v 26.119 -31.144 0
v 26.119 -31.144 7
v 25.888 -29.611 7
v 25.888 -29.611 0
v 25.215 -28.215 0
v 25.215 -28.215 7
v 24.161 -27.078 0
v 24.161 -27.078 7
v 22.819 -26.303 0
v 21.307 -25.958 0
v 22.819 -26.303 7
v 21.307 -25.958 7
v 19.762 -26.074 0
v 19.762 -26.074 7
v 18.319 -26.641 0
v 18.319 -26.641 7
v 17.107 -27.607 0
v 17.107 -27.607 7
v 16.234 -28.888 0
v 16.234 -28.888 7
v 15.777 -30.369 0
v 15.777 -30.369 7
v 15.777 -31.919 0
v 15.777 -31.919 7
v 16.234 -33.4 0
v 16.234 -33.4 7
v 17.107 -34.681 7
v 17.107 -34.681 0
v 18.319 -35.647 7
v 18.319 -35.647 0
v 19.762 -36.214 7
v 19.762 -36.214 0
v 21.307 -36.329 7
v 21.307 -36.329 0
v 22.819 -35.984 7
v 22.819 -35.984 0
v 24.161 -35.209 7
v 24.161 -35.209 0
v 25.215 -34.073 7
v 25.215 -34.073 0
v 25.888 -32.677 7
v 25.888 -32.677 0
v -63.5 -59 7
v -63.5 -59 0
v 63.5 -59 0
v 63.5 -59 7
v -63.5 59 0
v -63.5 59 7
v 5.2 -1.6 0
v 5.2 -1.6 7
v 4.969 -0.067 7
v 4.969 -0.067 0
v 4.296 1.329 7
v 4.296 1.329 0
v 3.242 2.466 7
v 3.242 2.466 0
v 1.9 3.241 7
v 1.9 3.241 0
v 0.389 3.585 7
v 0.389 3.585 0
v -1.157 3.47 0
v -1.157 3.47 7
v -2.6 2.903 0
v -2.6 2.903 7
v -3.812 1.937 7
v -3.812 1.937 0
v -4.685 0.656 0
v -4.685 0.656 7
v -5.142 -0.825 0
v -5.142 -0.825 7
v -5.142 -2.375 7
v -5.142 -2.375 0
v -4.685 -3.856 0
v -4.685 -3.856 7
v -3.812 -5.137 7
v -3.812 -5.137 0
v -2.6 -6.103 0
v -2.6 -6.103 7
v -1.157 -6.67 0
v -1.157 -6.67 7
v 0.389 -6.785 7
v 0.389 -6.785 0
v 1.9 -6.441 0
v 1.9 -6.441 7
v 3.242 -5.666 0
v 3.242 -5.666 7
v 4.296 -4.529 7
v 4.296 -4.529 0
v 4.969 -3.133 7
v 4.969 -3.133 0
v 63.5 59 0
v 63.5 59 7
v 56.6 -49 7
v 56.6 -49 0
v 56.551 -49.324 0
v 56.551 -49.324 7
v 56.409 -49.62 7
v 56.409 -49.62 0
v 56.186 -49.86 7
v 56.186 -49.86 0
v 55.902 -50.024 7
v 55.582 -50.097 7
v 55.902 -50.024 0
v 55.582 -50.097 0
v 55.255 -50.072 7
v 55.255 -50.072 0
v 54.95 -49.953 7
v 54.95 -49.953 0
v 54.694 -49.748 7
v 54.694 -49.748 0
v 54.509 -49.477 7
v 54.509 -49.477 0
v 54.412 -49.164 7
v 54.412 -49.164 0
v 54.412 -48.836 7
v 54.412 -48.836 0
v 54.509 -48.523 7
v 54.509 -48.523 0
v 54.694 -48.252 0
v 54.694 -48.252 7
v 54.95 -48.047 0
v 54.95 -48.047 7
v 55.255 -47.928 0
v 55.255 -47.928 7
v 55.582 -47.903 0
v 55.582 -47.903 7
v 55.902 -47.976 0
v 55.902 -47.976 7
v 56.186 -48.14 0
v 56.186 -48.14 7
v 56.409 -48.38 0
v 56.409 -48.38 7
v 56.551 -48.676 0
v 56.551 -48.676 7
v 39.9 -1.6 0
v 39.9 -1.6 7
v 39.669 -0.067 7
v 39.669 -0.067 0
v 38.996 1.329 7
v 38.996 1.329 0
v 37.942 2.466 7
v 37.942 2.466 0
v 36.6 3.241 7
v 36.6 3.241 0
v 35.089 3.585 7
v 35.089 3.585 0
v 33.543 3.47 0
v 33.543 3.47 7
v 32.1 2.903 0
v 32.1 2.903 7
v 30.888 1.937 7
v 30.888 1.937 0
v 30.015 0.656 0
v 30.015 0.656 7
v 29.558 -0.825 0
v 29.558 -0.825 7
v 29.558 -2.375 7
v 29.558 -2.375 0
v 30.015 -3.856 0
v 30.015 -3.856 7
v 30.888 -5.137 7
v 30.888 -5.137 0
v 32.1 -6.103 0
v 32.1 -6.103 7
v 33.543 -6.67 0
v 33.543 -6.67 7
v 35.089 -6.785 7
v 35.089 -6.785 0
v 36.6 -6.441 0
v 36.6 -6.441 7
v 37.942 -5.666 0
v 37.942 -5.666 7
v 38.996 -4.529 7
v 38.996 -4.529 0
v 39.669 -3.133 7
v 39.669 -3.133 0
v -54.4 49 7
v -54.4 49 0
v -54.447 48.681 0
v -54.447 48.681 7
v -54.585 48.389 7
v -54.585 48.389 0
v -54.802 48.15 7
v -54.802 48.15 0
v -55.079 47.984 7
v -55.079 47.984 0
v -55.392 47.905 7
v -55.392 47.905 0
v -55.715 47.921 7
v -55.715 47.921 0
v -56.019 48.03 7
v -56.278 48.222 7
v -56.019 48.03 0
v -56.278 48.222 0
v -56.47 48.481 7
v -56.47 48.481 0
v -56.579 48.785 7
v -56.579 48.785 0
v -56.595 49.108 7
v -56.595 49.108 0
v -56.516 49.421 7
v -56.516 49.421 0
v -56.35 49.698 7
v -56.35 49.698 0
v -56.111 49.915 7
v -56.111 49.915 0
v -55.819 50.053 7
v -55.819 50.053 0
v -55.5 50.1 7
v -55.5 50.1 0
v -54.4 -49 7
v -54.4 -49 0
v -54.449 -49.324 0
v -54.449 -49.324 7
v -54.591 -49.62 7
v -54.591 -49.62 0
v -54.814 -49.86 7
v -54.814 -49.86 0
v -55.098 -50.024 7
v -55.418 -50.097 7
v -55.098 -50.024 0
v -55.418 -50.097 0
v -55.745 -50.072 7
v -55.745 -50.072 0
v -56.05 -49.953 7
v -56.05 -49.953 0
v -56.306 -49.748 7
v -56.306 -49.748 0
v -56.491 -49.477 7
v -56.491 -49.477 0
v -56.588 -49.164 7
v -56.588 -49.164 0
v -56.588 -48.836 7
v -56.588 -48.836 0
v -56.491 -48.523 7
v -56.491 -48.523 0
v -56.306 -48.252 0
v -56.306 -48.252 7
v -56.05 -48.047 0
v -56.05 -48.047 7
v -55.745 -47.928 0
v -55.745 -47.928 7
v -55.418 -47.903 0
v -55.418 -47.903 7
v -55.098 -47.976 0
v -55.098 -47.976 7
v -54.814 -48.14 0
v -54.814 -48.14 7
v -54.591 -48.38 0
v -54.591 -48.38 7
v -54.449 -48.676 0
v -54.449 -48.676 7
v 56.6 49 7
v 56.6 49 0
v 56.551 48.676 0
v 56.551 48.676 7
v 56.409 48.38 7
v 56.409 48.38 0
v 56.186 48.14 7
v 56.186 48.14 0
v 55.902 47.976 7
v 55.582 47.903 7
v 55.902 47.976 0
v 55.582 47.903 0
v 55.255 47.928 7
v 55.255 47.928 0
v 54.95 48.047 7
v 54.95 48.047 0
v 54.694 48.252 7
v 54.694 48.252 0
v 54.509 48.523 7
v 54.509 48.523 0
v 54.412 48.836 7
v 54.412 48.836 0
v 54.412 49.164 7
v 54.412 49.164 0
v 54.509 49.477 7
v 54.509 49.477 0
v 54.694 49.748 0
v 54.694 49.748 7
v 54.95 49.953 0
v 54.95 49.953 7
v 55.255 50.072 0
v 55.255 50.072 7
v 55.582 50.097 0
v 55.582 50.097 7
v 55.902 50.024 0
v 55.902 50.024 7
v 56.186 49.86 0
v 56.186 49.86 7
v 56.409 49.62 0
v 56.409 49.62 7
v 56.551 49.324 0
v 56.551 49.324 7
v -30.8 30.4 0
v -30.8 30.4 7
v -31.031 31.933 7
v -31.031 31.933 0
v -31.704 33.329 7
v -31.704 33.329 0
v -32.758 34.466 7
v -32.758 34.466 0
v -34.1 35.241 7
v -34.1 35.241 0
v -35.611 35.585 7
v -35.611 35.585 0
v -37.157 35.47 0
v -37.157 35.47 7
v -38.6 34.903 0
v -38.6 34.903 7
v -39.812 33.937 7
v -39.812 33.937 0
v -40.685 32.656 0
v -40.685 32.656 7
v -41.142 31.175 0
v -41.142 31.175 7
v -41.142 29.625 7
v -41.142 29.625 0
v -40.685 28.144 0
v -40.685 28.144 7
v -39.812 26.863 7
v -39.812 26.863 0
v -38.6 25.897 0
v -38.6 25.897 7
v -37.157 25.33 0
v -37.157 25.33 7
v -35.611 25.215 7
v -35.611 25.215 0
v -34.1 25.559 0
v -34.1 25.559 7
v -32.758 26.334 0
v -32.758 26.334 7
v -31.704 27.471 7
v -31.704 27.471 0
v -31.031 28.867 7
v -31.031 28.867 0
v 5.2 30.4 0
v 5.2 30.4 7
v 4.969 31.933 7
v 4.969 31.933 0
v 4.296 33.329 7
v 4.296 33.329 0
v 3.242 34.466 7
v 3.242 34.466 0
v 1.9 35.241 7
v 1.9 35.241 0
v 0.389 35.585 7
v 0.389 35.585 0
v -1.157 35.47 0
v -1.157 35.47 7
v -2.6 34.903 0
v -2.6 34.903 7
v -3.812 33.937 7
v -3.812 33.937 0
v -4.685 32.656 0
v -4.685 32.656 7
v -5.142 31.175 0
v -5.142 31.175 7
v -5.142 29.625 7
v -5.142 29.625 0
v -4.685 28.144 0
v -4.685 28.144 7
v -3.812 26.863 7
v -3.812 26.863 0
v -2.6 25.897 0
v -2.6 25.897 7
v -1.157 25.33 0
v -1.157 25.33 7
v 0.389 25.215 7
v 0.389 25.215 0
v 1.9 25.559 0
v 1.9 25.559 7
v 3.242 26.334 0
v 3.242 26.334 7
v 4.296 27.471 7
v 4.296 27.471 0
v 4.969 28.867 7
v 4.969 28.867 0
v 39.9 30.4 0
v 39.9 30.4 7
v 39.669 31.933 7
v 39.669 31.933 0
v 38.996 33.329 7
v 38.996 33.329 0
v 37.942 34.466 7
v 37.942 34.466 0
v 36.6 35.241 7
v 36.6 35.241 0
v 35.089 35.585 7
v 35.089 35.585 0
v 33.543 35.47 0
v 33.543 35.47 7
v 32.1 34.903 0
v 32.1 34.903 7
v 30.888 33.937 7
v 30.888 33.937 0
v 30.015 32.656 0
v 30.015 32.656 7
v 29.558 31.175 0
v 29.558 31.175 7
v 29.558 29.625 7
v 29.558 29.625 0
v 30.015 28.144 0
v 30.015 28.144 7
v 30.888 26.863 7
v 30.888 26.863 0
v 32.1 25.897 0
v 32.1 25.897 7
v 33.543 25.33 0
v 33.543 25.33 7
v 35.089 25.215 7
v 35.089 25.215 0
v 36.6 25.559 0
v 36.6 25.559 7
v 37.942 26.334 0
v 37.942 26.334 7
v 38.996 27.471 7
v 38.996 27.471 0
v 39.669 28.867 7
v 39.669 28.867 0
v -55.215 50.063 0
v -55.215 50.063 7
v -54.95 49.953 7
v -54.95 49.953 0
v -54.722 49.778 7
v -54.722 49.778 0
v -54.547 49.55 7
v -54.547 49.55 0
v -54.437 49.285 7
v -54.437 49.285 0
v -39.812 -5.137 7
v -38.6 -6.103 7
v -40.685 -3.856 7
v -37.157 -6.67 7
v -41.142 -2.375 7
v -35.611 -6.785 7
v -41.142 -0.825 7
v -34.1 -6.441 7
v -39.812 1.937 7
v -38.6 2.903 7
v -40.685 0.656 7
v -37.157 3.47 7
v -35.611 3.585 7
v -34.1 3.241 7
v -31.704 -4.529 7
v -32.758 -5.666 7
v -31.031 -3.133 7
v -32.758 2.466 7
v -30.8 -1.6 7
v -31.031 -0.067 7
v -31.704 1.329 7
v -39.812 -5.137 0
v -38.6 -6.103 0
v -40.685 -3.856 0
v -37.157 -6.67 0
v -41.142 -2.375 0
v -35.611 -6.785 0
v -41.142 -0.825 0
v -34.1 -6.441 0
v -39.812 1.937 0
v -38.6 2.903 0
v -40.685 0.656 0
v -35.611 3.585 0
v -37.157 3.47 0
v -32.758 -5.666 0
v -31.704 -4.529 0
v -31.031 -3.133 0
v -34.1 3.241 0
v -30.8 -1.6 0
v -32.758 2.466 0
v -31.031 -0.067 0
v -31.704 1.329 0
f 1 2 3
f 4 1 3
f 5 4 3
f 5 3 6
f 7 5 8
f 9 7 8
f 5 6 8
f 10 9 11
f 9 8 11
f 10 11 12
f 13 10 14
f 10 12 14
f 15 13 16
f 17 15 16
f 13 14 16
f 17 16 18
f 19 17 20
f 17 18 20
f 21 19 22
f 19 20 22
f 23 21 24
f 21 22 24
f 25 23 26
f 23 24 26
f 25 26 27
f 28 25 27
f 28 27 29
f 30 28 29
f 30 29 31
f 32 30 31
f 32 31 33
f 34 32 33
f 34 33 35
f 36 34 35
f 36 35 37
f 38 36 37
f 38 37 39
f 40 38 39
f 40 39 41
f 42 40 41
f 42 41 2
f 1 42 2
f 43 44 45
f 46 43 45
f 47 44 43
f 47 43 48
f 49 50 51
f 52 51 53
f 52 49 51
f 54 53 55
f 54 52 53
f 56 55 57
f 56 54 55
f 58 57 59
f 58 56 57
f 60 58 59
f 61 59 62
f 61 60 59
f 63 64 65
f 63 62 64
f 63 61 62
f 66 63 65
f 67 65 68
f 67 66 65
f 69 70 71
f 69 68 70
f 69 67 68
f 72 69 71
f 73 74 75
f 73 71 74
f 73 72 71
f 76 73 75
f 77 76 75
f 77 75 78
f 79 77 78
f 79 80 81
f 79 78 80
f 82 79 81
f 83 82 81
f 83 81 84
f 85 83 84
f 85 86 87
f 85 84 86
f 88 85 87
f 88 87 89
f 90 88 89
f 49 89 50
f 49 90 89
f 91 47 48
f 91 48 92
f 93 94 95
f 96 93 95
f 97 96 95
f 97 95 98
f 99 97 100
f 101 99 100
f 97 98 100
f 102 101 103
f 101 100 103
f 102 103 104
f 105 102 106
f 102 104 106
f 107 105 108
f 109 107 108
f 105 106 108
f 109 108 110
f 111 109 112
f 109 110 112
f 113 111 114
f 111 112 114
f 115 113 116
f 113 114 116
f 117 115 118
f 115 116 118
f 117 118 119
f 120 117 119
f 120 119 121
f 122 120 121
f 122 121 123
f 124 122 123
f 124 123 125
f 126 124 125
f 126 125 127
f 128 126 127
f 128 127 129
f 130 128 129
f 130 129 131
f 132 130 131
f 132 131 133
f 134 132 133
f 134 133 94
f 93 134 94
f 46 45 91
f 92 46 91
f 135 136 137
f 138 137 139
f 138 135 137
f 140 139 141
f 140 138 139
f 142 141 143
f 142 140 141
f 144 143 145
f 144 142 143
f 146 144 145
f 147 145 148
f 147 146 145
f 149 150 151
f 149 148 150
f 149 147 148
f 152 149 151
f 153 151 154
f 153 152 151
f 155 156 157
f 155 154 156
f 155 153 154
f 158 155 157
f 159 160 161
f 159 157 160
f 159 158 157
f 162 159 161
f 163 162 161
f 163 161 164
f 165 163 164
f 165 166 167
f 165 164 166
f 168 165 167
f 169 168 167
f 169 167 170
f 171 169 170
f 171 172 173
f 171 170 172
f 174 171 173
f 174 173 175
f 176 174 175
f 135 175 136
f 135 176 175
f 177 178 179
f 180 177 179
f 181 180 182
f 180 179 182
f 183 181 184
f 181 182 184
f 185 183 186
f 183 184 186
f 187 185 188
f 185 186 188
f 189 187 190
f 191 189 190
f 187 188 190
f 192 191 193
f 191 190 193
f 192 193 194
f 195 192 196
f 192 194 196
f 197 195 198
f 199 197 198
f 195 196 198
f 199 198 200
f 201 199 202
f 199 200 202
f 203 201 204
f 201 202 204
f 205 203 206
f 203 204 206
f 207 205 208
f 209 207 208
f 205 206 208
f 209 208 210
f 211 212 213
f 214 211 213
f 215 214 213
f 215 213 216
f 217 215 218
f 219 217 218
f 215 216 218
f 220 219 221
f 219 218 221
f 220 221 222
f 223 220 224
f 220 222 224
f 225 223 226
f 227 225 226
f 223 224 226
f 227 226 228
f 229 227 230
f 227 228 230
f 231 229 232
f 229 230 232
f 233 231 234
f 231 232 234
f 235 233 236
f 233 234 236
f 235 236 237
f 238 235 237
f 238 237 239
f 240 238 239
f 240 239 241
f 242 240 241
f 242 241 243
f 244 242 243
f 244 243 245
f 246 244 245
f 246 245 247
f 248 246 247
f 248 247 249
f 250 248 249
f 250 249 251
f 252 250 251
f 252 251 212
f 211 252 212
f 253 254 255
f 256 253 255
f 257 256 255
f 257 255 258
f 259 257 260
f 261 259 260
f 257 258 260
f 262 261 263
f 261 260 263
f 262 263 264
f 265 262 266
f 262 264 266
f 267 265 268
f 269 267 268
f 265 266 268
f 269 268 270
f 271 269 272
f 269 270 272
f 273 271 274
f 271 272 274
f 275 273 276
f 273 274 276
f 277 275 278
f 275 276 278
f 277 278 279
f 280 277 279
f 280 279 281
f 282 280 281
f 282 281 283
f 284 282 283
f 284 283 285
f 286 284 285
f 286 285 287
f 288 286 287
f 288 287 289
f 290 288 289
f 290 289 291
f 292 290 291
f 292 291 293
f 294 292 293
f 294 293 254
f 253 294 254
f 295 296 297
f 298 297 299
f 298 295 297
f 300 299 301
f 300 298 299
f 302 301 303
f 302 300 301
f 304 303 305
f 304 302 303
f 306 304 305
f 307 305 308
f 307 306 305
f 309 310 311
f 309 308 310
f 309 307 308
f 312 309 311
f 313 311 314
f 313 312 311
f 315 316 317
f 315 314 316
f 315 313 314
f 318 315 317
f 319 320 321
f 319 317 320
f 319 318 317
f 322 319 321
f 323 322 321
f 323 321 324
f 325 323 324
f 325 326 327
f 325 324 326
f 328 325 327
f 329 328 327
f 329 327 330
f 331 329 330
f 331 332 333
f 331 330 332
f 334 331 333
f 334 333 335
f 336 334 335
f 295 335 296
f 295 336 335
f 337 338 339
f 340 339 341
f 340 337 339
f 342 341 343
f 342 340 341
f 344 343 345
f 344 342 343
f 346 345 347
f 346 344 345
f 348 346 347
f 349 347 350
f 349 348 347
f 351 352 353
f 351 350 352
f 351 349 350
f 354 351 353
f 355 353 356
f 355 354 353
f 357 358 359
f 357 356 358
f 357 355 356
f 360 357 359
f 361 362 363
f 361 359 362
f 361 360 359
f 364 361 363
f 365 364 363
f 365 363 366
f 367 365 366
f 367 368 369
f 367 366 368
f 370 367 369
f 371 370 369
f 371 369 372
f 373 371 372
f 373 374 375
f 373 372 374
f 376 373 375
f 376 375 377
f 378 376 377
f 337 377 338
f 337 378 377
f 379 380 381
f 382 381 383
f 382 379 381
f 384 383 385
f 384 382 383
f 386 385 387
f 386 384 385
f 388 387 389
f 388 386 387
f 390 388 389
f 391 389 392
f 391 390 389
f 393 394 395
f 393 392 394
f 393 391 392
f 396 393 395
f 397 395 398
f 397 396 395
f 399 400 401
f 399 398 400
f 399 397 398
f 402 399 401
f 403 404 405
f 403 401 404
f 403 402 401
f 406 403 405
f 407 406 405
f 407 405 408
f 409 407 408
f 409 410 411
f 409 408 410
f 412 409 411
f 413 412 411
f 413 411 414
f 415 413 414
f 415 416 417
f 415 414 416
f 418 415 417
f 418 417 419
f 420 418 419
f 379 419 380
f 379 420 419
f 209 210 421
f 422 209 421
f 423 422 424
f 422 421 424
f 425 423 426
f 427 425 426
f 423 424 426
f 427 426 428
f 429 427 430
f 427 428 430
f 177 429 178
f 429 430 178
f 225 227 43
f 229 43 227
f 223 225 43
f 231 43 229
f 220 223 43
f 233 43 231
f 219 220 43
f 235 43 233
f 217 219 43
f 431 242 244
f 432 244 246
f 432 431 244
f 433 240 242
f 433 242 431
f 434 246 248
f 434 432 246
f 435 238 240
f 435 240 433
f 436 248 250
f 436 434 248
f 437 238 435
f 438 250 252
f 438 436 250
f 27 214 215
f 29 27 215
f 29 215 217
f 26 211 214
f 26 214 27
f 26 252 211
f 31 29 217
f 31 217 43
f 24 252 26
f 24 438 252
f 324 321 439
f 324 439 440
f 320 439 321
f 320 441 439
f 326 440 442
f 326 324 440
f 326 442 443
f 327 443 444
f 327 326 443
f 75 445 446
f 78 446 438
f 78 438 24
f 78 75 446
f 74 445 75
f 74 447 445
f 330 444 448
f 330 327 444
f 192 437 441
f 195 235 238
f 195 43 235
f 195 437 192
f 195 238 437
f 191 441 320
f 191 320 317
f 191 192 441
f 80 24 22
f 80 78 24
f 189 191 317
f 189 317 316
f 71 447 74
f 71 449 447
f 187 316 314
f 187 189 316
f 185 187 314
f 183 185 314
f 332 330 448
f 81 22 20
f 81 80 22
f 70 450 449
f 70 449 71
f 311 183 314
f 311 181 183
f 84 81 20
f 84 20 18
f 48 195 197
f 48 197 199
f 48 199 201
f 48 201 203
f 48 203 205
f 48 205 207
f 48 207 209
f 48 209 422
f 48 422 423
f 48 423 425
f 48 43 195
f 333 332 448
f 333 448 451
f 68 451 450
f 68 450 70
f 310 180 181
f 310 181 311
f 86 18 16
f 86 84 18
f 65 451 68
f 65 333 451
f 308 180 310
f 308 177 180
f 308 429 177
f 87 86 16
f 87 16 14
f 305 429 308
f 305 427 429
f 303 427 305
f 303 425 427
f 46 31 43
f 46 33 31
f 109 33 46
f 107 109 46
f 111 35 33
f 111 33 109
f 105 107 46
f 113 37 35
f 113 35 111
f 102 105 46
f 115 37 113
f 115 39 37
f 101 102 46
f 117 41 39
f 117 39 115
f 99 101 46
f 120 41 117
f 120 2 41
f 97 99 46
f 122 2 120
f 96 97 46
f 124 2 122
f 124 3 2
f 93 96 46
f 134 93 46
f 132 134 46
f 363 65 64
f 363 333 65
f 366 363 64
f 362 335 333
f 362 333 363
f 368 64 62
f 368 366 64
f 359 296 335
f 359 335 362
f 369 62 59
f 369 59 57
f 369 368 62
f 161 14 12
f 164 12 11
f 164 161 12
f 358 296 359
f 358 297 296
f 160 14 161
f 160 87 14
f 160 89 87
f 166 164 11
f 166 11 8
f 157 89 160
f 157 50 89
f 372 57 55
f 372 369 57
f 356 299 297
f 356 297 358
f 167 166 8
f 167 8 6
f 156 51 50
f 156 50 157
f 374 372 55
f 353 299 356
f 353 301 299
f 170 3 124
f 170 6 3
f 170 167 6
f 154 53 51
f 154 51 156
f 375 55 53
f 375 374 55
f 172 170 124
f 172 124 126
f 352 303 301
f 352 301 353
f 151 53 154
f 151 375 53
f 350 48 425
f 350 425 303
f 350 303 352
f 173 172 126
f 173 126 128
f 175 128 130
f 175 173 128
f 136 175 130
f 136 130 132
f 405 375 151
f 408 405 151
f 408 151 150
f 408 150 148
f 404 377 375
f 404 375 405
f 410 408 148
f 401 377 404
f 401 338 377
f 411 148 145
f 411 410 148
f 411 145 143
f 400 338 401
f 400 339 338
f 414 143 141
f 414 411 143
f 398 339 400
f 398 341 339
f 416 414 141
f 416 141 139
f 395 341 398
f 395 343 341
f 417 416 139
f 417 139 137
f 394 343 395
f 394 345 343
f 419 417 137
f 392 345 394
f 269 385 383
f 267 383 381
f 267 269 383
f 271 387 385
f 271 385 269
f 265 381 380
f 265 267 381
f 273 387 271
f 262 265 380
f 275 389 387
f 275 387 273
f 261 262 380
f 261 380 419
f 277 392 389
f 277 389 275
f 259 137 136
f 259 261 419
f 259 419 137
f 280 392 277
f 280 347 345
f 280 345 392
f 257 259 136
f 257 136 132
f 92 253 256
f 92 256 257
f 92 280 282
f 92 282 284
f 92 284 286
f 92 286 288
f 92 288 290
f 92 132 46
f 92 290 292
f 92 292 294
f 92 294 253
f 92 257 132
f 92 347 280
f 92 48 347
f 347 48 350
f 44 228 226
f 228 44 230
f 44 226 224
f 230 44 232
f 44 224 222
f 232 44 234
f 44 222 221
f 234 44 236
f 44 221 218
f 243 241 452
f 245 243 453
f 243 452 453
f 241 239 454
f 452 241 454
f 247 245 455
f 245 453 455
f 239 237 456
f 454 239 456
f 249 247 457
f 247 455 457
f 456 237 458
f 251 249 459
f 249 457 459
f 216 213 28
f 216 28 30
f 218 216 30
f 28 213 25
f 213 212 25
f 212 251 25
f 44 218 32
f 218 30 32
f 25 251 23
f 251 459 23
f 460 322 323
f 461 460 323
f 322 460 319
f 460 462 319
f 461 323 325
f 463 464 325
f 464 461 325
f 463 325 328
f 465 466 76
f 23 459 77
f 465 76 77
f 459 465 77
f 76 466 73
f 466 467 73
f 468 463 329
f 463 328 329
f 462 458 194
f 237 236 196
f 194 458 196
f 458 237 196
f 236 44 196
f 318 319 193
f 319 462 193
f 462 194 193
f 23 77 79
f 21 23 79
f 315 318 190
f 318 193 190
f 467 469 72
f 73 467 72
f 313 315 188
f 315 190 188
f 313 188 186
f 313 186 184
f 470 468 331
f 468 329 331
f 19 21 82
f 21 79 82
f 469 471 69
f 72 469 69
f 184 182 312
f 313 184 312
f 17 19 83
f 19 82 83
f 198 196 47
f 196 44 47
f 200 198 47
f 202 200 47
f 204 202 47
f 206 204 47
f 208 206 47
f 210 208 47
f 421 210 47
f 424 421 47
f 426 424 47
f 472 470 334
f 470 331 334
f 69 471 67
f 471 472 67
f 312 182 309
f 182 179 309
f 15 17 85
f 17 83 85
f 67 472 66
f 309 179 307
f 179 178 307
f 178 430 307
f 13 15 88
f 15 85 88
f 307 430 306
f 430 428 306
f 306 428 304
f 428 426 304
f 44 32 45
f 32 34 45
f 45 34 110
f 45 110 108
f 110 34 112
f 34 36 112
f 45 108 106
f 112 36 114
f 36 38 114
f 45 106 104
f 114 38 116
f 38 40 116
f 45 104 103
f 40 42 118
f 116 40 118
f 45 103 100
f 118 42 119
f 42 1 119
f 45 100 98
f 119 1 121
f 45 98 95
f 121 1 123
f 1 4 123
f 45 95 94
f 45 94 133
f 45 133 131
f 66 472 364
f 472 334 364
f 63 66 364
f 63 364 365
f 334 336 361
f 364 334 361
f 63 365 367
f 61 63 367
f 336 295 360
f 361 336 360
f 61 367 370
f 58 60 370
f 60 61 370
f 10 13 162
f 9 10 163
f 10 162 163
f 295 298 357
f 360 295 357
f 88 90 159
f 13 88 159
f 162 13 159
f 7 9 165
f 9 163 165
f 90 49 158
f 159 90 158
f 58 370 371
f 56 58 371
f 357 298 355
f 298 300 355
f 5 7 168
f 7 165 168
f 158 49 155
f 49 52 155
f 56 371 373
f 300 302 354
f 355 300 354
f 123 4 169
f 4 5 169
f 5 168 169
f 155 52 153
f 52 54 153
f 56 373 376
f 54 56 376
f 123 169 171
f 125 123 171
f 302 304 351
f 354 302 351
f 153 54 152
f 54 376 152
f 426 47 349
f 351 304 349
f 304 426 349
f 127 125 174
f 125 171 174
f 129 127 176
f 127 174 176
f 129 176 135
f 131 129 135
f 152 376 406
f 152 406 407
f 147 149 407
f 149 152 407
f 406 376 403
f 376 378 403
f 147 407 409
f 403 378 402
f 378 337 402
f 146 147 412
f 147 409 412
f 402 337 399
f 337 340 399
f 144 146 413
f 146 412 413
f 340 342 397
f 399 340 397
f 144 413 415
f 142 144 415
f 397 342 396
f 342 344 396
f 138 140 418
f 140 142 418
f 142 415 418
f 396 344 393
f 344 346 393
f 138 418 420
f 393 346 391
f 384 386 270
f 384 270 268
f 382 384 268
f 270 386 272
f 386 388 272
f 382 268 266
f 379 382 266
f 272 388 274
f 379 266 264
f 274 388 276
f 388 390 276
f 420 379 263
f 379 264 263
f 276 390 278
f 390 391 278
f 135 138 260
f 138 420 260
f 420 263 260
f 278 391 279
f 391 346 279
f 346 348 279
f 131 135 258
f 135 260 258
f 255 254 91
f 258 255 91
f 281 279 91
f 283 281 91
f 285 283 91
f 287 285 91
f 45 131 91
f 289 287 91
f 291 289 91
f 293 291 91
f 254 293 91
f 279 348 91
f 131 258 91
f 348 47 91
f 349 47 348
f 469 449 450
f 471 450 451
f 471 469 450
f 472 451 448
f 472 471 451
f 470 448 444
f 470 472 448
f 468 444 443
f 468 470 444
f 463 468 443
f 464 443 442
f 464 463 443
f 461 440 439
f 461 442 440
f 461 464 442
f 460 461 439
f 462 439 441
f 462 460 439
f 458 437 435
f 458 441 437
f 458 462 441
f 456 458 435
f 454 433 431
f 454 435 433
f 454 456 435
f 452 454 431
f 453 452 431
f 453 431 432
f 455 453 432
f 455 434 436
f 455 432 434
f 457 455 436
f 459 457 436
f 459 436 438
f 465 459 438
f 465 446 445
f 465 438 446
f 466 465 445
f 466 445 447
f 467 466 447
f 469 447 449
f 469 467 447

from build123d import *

# Parameters (mm, degrees)
F0_W     = 127
F0_H     = 118
F1_DEPTH = 7
F2_R     = 1.1
F3_DEPTH = 25
F4_R     = 5.2
F5_DEPTH = 7.001
F6_R     = 5.2
F7_DEPTH = 7.001


with BuildPart() as f1:
    # F0 (on Top) → F1 (new body)
    with BuildSketch(Plane.XY):
        Rectangle(F0_W, F0_H)
    extrude(amount=F1_DEPTH)

    # F2 (on face) → F3 (cut)
    with BuildSketch(Plane(origin=(0, 0, 0), x_dir=(1, 0, 0), z_dir=(0, 0, -1))):
        with BuildLine():
            ThreePointArc((-55.5, -50.1), (-54.722183, -49.777817), (-54.4, -49))
            ThreePointArc((-54.4, -49), (-56.277817, -48.222183), (-55.5, -50.1))
        make_face()
        with Locations((55.5, -49)):
            Circle(F2_R)
        with Locations((-55.5, 49)):
            Circle(F2_R)
        with Locations((55.5, 49)):
            Circle(F2_R)
    extrude(amount=-F3_DEPTH, mode=Mode.SUBTRACT)

    # F4 (on Top) → F5 (cut, through all)
    with BuildSketch(Plane.XY):
        with Locations((-36, 30.4)):
            Circle(F4_R)
        with Locations((-36, -1.6)):
            Circle(F4_R)
        with Locations((0, -1.6)):
            Circle(F4_R)
        with Locations((34.7, -1.6)):
            Circle(F4_R)
        with Locations((34.7, 30.4)):
            Circle(F4_R)
        with Locations((0, 30.4)):
            Circle(F4_R)
    extrude(amount=F5_DEPTH, mode=Mode.SUBTRACT)

    # F6 (on face) → F7 (cut, through all)
    with BuildSketch(Plane.XY.offset(7)):
        with Locations((20.918876, -31.143876)):
            Circle(F6_R)
    extrude(amount=-F7_DEPTH, mode=Mode.SUBTRACT)


solid = f1.part
